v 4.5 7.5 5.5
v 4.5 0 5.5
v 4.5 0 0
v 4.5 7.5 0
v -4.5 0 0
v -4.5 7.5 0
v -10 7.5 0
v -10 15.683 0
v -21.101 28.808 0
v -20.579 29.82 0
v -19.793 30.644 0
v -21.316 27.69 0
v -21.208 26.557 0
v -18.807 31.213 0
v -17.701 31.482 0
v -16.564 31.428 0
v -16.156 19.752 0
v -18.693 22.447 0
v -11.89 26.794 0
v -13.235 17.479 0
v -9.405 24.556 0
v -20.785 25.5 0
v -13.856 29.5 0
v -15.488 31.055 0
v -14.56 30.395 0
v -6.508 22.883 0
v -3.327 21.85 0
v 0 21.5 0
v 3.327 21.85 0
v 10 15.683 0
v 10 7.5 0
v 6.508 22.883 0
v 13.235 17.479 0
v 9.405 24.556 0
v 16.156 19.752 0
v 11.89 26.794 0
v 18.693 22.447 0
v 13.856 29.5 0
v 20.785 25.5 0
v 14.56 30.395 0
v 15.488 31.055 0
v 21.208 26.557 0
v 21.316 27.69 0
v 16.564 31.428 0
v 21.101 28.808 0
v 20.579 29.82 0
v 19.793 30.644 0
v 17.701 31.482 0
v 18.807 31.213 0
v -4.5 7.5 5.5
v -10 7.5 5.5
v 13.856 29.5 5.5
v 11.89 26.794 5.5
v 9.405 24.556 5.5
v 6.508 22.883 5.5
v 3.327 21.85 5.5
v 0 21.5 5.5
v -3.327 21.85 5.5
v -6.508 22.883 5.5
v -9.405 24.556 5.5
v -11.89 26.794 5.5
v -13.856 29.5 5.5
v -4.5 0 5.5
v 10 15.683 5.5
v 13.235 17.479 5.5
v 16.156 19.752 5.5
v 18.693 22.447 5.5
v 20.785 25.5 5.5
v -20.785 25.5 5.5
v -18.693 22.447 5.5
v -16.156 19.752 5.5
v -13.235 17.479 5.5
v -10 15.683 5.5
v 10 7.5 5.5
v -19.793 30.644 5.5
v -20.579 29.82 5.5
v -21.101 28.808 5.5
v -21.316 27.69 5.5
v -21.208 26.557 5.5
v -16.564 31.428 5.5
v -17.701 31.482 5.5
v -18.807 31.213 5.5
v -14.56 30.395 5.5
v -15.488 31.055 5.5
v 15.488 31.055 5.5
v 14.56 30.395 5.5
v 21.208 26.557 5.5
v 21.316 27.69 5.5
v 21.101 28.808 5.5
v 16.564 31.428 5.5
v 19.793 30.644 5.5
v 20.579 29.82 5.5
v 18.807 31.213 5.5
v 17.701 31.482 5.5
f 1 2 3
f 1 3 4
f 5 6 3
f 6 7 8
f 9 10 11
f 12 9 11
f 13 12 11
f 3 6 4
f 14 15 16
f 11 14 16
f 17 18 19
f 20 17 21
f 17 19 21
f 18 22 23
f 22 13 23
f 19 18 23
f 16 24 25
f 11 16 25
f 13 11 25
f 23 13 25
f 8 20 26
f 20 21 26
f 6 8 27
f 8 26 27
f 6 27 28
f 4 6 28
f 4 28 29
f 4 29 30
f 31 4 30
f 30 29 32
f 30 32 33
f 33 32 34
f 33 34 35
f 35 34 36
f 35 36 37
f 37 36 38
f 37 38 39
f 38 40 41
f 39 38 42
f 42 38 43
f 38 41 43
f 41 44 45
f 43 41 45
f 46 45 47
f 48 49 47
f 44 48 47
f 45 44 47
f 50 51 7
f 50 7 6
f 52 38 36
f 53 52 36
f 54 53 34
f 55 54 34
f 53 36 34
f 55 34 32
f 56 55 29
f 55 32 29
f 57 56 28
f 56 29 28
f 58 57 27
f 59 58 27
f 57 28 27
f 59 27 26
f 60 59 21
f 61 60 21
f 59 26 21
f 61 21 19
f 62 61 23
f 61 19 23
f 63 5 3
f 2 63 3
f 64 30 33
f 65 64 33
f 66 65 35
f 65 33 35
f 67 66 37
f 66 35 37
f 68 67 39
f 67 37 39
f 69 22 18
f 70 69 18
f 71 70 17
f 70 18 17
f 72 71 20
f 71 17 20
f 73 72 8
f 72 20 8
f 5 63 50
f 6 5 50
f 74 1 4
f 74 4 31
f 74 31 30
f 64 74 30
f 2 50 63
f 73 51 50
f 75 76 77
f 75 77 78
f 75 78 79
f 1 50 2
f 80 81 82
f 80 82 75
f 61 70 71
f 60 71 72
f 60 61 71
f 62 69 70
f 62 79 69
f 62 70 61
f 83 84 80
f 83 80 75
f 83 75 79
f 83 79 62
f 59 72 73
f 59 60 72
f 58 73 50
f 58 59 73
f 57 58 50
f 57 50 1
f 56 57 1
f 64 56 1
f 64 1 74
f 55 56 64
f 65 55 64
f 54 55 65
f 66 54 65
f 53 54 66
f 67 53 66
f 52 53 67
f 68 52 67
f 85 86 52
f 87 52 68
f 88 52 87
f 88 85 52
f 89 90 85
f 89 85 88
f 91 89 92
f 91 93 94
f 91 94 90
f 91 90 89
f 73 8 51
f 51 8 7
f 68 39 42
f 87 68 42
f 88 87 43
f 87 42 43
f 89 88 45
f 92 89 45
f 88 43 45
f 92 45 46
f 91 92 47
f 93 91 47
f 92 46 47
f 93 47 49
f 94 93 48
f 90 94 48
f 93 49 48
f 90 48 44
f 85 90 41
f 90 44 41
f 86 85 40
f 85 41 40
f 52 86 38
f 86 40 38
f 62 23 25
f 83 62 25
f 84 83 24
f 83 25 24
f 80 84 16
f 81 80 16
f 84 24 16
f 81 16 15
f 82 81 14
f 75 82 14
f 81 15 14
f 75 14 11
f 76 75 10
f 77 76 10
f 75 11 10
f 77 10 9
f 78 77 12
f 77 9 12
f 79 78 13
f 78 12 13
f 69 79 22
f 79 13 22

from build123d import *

# Parameters (mm, degrees)
EXTRUDE_1_DEPTH     = 5.5
SKETCH_2_W          = 5.5
SKETCH_2_H          = 7.5
CUT_EXTRUDE_1_DEPTH = 39.432591177


with BuildPart() as part:
    # ｽｹｯﾁ1 → ﾎﾞｽ - 押し出し1 (new body)
    with BuildSketch(Plane.XY):
        with BuildLine():
            Line((-10, 15.682575771), (-10, 0))
            Line((-10, 0), (10, 0))
            Line((10, 0), (10, 15.682575771))
            ThreePointArc((10, 15.682575771), (16.156067067, 19.752281924), (20.784609691, 25.5))
            ThreePointArc((20.784609691, 25.5), (19.320508076, 30.964101615), (13.856406461, 29.5))
            ThreePointArc((13.856406461, 29.5), (0, 21.5), (-13.856406461, 29.5))
            ThreePointArc((-13.856406461, 29.5), (-19.320508076, 30.964101615), (-20.784609691, 25.5))
            ThreePointArc((-20.784609691, 25.5), (-16.156067067, 19.752281924), (-10, 15.682575771))
        make_face()
    extrude(amount=EXTRUDE_1_DEPTH)

    # ｽｹｯﾁ2 → ｶｯﾄ - 押し出し1 (cut, through all)
    with BuildSketch(Plane.XY.offset(5.5)):
        with Locations((7.25, 3.75)):
            Rectangle(SKETCH_2_W, SKETCH_2_H)
        with Locations((-7.25, 3.75)):
            Rectangle(SKETCH_2_W, SKETCH_2_H)
    extrude(amount=-CUT_EXTRUDE_1_DEPTH, mode=Mode.SUBTRACT)


solid = part.part
